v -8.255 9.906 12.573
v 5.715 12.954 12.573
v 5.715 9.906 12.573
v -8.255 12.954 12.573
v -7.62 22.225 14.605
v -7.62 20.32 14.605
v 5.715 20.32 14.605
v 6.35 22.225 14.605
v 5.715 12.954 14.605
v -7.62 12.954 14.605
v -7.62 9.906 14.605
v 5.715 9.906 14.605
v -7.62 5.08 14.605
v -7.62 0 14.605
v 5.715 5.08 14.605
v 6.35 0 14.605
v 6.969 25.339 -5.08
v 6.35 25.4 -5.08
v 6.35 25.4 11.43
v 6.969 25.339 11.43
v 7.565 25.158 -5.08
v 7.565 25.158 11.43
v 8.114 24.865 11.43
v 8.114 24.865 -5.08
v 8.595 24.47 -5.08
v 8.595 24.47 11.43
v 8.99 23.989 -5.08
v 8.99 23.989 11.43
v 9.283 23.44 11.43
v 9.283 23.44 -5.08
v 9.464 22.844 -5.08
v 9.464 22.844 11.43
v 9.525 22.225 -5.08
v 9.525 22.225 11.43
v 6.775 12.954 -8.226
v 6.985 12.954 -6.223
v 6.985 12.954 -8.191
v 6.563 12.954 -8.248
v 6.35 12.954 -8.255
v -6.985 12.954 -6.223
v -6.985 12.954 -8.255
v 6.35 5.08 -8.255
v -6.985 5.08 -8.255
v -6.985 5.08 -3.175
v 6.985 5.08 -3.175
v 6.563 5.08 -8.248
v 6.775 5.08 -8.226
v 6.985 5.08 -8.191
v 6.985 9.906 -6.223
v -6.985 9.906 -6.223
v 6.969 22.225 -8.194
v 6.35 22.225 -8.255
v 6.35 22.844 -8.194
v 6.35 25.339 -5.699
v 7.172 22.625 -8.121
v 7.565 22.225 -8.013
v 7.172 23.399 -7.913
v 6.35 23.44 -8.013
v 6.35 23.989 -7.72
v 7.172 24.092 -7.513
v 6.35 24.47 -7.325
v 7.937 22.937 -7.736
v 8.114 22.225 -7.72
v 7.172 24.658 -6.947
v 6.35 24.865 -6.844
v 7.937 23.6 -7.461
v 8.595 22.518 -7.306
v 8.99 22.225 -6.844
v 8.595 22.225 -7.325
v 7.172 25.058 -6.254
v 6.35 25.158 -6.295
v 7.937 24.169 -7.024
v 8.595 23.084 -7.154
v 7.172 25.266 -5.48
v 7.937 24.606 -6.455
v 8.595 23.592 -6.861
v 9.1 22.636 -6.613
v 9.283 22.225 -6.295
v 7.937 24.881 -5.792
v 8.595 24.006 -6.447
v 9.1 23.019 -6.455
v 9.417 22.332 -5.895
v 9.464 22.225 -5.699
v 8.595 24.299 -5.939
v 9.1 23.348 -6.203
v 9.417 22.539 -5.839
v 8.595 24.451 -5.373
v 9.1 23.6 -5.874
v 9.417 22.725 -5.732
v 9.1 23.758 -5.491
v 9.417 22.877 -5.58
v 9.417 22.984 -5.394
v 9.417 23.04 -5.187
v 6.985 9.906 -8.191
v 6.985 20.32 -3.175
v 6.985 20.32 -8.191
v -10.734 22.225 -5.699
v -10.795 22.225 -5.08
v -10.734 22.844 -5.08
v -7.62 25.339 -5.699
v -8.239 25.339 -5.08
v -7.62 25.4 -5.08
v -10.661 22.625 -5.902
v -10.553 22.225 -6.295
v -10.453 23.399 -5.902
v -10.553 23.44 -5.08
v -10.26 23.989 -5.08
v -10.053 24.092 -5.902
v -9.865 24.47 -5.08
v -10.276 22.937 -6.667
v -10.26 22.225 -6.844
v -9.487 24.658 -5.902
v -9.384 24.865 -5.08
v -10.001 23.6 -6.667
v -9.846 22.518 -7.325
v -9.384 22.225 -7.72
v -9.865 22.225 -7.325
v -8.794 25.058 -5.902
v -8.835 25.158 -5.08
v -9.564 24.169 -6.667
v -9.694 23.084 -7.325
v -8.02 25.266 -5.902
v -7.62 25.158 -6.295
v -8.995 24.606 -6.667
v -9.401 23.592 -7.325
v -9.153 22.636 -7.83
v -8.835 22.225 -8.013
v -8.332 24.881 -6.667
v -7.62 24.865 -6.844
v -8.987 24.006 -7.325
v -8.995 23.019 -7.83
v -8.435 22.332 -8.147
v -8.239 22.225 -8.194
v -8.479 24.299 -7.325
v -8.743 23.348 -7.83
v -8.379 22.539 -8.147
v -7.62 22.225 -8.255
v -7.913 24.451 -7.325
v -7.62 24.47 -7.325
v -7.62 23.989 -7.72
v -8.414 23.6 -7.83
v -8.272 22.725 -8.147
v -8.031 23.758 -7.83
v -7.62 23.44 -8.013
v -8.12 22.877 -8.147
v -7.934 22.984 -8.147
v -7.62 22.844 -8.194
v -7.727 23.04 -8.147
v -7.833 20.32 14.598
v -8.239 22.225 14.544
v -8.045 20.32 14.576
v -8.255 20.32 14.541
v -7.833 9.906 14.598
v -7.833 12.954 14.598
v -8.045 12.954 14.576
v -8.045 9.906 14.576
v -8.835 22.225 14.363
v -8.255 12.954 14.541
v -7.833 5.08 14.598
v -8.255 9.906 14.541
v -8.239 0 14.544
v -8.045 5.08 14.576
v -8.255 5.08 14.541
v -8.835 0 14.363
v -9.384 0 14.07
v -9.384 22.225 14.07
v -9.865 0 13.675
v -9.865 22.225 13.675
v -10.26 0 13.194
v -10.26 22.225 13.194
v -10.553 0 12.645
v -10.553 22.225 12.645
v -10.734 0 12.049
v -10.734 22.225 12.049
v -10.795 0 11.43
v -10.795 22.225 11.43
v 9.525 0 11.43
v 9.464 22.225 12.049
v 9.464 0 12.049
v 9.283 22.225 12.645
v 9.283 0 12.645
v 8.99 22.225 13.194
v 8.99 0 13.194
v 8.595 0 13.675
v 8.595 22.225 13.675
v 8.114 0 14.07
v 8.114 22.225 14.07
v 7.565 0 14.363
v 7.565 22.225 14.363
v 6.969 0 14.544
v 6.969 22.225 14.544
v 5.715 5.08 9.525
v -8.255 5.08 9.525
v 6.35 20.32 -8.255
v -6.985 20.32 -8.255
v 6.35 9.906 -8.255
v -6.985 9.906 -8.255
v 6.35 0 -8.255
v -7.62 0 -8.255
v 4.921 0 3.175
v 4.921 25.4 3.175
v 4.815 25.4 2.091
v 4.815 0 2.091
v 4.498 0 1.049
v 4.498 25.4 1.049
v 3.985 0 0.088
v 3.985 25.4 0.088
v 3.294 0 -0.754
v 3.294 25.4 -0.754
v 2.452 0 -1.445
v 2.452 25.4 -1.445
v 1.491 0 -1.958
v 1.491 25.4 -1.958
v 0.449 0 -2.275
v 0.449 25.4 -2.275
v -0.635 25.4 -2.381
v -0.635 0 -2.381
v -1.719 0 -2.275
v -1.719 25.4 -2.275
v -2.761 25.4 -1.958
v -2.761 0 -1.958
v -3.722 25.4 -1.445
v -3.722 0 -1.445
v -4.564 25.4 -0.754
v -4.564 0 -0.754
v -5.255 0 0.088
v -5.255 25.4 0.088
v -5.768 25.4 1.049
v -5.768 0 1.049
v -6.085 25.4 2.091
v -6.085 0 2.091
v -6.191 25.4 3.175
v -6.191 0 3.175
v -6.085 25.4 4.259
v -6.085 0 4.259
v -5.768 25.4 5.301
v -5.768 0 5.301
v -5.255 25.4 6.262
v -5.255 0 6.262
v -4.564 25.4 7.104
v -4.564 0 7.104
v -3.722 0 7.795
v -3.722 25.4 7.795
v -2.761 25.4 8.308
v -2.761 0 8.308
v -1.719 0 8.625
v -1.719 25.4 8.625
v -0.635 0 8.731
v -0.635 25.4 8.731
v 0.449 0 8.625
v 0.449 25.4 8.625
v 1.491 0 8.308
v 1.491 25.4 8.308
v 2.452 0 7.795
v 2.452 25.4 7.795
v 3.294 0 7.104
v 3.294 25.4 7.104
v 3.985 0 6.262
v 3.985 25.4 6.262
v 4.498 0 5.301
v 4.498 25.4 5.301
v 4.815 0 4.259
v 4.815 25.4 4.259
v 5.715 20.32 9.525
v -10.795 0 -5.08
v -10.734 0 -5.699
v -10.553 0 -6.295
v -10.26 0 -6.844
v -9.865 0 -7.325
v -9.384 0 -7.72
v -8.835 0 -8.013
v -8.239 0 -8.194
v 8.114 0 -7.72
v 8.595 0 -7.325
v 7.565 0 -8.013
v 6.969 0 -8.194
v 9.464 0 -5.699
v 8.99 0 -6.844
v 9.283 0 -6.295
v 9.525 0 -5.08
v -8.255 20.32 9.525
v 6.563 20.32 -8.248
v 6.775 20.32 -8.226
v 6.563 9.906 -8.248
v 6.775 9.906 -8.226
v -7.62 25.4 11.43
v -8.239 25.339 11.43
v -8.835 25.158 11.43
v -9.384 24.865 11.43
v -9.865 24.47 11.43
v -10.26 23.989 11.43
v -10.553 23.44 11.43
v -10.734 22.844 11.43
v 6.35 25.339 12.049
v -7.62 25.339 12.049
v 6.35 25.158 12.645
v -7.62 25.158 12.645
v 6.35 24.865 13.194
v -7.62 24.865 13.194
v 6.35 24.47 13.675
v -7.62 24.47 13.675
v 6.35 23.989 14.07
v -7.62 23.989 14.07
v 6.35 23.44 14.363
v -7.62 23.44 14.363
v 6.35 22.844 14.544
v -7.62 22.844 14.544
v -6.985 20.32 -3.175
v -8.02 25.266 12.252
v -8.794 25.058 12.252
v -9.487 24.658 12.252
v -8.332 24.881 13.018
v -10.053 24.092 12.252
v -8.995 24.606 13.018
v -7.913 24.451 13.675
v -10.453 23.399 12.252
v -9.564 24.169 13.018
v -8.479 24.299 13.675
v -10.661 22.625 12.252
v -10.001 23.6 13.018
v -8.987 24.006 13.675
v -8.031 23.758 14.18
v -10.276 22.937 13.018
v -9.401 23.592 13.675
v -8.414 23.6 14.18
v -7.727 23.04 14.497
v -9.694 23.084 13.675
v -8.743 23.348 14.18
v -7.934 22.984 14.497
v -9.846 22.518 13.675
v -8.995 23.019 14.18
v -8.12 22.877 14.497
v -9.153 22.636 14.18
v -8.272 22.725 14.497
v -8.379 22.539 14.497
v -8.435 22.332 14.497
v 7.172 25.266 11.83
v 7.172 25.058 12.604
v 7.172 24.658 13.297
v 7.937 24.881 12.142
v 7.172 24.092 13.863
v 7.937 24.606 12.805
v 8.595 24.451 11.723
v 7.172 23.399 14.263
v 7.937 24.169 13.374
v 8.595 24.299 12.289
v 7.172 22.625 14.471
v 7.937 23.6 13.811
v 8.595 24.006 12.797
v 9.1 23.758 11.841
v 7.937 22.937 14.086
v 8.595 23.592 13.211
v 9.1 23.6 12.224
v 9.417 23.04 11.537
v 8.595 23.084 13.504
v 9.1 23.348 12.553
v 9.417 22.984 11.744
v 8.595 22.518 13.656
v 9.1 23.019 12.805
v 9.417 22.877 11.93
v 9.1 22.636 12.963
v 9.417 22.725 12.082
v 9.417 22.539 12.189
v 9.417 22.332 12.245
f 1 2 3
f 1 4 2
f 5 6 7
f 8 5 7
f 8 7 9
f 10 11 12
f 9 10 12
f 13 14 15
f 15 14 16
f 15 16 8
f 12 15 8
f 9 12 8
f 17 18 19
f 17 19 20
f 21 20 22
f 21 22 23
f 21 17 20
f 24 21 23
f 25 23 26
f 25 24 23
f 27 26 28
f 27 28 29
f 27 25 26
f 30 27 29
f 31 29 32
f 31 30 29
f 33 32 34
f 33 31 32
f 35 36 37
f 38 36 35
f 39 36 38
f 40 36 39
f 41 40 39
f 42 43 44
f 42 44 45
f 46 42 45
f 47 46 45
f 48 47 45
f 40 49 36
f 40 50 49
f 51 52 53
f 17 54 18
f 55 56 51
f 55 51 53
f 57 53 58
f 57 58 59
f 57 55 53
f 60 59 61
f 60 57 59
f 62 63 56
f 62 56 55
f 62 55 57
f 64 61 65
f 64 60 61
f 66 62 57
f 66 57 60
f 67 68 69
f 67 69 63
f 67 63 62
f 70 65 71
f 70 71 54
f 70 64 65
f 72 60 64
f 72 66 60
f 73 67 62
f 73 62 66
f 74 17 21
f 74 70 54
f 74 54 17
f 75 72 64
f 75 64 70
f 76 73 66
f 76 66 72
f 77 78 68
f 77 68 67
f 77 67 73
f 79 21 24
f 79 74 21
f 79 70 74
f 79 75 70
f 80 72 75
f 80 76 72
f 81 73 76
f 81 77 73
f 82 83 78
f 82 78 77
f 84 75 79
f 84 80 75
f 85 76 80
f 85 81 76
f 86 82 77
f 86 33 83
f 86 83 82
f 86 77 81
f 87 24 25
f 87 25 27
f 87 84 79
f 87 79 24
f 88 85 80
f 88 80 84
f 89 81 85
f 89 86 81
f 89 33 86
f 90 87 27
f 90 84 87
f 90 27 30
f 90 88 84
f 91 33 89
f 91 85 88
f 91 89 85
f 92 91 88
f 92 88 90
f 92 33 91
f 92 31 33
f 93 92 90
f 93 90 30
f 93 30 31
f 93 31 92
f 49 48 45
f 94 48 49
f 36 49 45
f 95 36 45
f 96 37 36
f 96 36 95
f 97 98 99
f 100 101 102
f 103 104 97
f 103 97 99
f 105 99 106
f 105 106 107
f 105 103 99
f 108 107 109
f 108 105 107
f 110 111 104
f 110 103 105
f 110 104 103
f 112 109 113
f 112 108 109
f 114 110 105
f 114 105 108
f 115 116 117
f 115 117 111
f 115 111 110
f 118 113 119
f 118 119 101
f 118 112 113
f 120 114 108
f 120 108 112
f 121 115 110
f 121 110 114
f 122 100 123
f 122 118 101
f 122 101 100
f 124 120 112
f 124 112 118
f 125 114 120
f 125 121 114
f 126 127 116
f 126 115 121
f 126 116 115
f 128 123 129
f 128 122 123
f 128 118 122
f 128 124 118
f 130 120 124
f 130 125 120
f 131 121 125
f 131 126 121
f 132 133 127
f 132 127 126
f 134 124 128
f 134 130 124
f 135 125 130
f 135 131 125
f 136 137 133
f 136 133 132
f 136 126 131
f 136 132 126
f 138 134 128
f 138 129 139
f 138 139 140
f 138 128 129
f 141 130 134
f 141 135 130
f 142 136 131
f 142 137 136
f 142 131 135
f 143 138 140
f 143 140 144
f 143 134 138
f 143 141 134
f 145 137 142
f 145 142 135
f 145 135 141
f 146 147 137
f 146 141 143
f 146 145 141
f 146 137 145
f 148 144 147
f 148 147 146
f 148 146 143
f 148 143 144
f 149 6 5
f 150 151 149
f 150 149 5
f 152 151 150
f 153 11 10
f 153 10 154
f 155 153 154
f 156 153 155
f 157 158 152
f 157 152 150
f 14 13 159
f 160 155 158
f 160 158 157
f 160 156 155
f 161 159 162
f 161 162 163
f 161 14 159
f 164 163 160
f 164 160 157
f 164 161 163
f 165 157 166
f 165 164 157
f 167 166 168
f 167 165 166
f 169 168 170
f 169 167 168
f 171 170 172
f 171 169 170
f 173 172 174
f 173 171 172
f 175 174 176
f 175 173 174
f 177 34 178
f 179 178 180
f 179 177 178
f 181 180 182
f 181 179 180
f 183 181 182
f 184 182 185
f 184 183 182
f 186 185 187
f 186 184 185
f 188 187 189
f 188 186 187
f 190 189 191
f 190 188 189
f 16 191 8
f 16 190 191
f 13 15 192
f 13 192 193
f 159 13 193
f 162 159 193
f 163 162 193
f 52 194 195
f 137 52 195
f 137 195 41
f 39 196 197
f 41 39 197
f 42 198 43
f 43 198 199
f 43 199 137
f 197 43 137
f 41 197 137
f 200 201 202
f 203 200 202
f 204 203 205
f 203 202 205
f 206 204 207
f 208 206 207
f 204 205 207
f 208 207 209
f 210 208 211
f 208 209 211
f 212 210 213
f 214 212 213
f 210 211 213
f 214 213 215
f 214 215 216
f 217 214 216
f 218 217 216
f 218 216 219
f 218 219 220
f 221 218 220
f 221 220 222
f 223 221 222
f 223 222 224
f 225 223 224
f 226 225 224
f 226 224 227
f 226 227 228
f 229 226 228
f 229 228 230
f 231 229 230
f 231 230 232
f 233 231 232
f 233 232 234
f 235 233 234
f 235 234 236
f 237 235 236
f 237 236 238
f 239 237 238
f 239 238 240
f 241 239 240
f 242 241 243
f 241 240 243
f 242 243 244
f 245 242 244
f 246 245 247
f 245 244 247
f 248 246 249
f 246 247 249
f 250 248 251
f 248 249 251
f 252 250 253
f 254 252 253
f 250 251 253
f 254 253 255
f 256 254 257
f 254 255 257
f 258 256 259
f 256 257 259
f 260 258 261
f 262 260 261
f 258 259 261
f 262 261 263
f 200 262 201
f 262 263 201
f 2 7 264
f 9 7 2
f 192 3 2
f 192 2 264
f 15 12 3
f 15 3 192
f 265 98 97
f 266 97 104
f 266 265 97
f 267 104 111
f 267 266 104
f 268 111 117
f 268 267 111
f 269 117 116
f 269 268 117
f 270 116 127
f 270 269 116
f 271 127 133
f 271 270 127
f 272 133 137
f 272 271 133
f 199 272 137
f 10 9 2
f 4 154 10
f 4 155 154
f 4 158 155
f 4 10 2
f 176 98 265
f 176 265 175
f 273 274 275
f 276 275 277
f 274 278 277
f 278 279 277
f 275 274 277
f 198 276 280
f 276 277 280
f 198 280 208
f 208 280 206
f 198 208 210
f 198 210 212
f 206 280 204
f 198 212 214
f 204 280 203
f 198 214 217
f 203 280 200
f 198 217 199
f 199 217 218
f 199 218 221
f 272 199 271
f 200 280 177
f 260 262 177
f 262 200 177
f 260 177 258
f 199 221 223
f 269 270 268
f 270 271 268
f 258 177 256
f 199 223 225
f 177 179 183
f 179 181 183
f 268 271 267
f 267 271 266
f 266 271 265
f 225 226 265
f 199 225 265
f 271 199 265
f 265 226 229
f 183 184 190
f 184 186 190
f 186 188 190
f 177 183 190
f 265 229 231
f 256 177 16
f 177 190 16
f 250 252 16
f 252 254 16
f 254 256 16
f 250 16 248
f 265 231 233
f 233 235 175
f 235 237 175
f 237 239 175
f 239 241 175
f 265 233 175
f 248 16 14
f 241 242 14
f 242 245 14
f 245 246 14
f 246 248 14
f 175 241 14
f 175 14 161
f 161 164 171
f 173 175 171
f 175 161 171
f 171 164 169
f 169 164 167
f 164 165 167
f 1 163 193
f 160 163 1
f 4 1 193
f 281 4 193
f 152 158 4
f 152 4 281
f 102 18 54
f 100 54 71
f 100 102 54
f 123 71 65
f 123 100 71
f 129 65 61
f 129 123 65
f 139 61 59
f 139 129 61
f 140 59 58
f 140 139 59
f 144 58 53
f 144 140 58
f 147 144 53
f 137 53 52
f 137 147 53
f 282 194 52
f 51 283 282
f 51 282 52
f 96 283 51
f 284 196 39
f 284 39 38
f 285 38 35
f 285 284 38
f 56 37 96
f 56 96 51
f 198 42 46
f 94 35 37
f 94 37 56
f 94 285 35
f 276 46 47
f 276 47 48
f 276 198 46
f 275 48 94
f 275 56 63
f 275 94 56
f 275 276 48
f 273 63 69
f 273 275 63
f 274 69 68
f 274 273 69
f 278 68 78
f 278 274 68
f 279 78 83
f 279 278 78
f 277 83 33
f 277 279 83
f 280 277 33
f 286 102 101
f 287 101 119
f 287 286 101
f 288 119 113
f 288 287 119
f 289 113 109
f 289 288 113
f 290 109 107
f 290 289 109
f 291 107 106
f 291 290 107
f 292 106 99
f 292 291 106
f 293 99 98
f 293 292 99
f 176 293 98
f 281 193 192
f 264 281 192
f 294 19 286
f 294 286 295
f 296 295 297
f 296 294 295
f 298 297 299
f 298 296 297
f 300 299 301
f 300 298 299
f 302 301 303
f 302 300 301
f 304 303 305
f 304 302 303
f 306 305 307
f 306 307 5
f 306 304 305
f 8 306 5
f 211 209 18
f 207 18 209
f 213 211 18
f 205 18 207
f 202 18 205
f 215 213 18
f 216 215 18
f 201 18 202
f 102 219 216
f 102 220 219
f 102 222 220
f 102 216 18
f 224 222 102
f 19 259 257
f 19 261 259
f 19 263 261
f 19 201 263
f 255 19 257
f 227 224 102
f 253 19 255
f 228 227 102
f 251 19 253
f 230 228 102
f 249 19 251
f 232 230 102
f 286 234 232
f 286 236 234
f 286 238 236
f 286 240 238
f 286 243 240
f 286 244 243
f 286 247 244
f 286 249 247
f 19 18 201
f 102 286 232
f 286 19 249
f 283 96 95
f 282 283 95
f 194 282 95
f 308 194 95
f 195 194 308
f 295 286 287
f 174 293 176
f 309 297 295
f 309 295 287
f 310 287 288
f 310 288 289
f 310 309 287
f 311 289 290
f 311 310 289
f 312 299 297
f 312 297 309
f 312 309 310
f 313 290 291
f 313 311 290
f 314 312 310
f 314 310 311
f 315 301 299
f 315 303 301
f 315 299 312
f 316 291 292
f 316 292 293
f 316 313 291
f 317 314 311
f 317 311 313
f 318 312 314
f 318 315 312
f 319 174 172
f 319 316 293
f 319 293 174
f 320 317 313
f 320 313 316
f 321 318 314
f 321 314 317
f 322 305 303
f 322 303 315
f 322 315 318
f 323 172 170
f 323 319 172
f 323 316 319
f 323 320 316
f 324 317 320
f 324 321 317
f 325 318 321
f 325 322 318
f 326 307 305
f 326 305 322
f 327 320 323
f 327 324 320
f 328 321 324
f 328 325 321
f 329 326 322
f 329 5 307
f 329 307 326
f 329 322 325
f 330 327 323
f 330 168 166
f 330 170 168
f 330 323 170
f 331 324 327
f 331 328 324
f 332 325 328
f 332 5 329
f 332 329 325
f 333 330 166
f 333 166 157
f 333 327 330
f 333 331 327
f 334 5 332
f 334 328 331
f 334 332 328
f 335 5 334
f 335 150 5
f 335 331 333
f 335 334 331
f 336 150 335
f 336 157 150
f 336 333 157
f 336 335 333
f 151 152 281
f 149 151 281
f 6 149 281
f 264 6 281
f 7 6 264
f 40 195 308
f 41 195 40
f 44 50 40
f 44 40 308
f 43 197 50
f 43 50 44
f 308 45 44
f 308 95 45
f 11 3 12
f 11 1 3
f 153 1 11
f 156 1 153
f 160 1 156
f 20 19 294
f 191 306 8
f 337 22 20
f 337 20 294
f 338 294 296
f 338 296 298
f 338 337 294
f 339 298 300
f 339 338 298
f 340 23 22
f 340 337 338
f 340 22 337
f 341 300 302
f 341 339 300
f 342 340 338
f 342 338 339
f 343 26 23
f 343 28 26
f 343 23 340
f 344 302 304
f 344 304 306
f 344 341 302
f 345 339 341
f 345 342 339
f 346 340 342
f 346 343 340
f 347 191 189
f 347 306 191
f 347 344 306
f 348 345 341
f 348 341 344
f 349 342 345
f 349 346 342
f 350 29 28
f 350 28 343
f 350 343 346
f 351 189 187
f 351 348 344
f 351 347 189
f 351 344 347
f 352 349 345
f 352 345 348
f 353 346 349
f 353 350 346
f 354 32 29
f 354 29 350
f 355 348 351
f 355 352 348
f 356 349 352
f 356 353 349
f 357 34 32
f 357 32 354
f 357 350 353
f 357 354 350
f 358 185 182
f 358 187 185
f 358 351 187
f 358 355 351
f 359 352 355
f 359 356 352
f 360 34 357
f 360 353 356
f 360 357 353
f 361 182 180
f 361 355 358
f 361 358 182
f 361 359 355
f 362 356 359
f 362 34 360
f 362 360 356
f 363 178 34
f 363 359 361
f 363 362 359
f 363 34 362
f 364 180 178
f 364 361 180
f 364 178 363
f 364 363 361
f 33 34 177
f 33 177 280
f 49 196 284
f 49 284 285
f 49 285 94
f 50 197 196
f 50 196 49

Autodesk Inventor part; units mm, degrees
ref_plane "YZ Plane" through (0, 0, 0) normal (1, 0, 0) x (0, 1, 0)
ref_plane "XZ Plane" through (0, 0, 0) normal (0, 1, 0) x (-1, 0, 0)
ref_plane "XY Plane" through (0, 0, 0) normal (0, 0, 1) x (1, 0, 0)
sketch "Sketch1" plane through (0, 0, 0) normal (0, 1, 0) x (-1, 0, 0)
  line L0 (-9.525, -8.255) -> (10.795, -8.255)
  line L1 (10.795, -8.255) -> (10.795, 14.605)
  line L2 (10.795, 14.605) -> (-9.525, 14.605)
  line L3 (-9.525, 14.605) -> (-9.525, -8.255)
  line L4 (-9.525, -8.255) -> (10.795, 14.605) construction
  line L5 (10.795, -8.255) -> (-9.525, 14.605) construction
  point P0 (0.635, 3.175)
  dimension "d9" = 20.32
  dimension "d10" = 22.86
extrude "Extrusion3" add sketch "Sketch1" along normal blind 25.4
sketch "actual_circle" plane through (0, 25.4, 0) normal (0, 1, 0) x (1, 0, 0)
  circle A0 centre (-0.635, -3.175) radius 5.5563
  line L0 (9.525, 8.255) -> (-10.795, 8.255) projected
  line L1 (-10.795, 8.255) -> (-10.795, -14.605) projected
  dimension "d27" = 11.1125
  dimension "d57" = 11.43
  dimension "d58" = 10.16
extrude "Extrusion6" cut sketch "actual_circle" against normal blind 50.8
sketch "circle" plane through (-10.795, 0, 14.605) normal (0, 0, 1) x (1, 0, 0)
  line L0 (2.54, 20.32) -> (16.51, 20.32)
  line L1 (16.51, 20.32) -> (16.51, 5.08)
  line L2 (16.51, 5.08) -> (2.54, 5.08)
  line L3 (2.54, 5.08) -> (2.54, 20.32)
  line L4 (0, 25.4) -> (20.32, 25.4) projected
  line L5 (0, 0) -> (0, 25.4) projected
  point P0 (10.795, 0)
  dimension "d32" = 13.97
  dimension "d33" = 15.24
  dimension "d34" = 5.08
  dimension "d35" = 2.54
extrude "Extrusion7" cut sketch "circle" against normal blind 5.08
sketch "Sketch7" plane through (9.525, 0, -8.255) normal (0, 0, -1) x (-1, 0, 0)
  line L0 (2.54, 20.32) -> (16.51, 20.32)
  line L1 (16.51, 20.32) -> (16.51, 5.08)
  line L2 (16.51, 5.08) -> (2.54, 5.08)
  line L3 (2.54, 5.08) -> (2.54, 20.32)
  line L4 (0, 0) -> (0, 25.4) projected
  line L5 (0, 25.4) -> (20.32, 25.4) projected
  point P0 (9.525, 0)
  dimension "d38" = 13.97
  dimension "d39" = 15.24
  dimension "d40" = 2.54
  dimension "d41" = 5.08
extrude "Extrusion8" cut sketch "Sketch7" against normal blind 5.08
sketch "Lock" plane through (-6.985, 5.08, -8.255) normal (1, 0, 0) x (0, 0, -1)
  line L0 (-2.032, 7.874) -> (0, 7.874)
  line L1 (0, 7.874) -> (0, 4.826)
  line L2 (0, 4.826) -> (-2.032, 4.826)
  line L3 (-2.032, 4.826) -> (-2.032, 7.874)
  line L4 (-5.08, 15.24) -> (-5.08, 0) projected
  line L5 (0, 15.24) -> (0, 0) projected
  point P0 (-8.255, -5.08)
  dimension "d44" = 2.032
  dimension "d45" = 3.048
  dimension "d46" = 7.366
  dimension "d59" = 0
extrude "Extrusion9" add sketch "Lock" along normal blind 13.97
sketch "Sketch9" plane through (-8.255, 5.08, 14.605) normal (1, 0, 0) x (0, 0, -1)
  line L0 (0, 7.874) -> (2.032, 7.874)
  line L1 (2.032, 7.874) -> (2.032, 4.826)
  line L2 (2.032, 4.826) -> (0, 4.826)
  line L3 (0, 4.826) -> (0, 7.874)
  line L4 (0, 0) -> (0, 15.24) projected
  point P0 (14.605, -5.08)
  dimension "d50" = 2.032
  dimension "d51" = 3.048
  dimension "d52" = 0
  dimension "d53" = 7.366
extrude "Extrusion10" add sketch "Sketch9" along normal blind 13.97
fillet "Fillet1" radius 3.175 4 edges at (-10.795, 25.4, 3.175) (9.525, 25.4, 3.175) (-0.635, 25.4, 14.605) (-0.635, 25.4, -8.255)
fillet "Fillet2" radius 3.175 8 edges at (8.5951, 24.4701, 13.6751) (9.525, 11.1125, 14.605) (8.5951, 24.4701, -7.3251) (9.525, 11.1125, -8.255) (-9.8651, 24.4701, -7.3251) (-10.795, 11.1125, -8.255) (-9.8651, 24.4701, 13.6751) (-10.795, 11.1125, 14.605)
properties part number "TM_Weird_Box_LMMM"
